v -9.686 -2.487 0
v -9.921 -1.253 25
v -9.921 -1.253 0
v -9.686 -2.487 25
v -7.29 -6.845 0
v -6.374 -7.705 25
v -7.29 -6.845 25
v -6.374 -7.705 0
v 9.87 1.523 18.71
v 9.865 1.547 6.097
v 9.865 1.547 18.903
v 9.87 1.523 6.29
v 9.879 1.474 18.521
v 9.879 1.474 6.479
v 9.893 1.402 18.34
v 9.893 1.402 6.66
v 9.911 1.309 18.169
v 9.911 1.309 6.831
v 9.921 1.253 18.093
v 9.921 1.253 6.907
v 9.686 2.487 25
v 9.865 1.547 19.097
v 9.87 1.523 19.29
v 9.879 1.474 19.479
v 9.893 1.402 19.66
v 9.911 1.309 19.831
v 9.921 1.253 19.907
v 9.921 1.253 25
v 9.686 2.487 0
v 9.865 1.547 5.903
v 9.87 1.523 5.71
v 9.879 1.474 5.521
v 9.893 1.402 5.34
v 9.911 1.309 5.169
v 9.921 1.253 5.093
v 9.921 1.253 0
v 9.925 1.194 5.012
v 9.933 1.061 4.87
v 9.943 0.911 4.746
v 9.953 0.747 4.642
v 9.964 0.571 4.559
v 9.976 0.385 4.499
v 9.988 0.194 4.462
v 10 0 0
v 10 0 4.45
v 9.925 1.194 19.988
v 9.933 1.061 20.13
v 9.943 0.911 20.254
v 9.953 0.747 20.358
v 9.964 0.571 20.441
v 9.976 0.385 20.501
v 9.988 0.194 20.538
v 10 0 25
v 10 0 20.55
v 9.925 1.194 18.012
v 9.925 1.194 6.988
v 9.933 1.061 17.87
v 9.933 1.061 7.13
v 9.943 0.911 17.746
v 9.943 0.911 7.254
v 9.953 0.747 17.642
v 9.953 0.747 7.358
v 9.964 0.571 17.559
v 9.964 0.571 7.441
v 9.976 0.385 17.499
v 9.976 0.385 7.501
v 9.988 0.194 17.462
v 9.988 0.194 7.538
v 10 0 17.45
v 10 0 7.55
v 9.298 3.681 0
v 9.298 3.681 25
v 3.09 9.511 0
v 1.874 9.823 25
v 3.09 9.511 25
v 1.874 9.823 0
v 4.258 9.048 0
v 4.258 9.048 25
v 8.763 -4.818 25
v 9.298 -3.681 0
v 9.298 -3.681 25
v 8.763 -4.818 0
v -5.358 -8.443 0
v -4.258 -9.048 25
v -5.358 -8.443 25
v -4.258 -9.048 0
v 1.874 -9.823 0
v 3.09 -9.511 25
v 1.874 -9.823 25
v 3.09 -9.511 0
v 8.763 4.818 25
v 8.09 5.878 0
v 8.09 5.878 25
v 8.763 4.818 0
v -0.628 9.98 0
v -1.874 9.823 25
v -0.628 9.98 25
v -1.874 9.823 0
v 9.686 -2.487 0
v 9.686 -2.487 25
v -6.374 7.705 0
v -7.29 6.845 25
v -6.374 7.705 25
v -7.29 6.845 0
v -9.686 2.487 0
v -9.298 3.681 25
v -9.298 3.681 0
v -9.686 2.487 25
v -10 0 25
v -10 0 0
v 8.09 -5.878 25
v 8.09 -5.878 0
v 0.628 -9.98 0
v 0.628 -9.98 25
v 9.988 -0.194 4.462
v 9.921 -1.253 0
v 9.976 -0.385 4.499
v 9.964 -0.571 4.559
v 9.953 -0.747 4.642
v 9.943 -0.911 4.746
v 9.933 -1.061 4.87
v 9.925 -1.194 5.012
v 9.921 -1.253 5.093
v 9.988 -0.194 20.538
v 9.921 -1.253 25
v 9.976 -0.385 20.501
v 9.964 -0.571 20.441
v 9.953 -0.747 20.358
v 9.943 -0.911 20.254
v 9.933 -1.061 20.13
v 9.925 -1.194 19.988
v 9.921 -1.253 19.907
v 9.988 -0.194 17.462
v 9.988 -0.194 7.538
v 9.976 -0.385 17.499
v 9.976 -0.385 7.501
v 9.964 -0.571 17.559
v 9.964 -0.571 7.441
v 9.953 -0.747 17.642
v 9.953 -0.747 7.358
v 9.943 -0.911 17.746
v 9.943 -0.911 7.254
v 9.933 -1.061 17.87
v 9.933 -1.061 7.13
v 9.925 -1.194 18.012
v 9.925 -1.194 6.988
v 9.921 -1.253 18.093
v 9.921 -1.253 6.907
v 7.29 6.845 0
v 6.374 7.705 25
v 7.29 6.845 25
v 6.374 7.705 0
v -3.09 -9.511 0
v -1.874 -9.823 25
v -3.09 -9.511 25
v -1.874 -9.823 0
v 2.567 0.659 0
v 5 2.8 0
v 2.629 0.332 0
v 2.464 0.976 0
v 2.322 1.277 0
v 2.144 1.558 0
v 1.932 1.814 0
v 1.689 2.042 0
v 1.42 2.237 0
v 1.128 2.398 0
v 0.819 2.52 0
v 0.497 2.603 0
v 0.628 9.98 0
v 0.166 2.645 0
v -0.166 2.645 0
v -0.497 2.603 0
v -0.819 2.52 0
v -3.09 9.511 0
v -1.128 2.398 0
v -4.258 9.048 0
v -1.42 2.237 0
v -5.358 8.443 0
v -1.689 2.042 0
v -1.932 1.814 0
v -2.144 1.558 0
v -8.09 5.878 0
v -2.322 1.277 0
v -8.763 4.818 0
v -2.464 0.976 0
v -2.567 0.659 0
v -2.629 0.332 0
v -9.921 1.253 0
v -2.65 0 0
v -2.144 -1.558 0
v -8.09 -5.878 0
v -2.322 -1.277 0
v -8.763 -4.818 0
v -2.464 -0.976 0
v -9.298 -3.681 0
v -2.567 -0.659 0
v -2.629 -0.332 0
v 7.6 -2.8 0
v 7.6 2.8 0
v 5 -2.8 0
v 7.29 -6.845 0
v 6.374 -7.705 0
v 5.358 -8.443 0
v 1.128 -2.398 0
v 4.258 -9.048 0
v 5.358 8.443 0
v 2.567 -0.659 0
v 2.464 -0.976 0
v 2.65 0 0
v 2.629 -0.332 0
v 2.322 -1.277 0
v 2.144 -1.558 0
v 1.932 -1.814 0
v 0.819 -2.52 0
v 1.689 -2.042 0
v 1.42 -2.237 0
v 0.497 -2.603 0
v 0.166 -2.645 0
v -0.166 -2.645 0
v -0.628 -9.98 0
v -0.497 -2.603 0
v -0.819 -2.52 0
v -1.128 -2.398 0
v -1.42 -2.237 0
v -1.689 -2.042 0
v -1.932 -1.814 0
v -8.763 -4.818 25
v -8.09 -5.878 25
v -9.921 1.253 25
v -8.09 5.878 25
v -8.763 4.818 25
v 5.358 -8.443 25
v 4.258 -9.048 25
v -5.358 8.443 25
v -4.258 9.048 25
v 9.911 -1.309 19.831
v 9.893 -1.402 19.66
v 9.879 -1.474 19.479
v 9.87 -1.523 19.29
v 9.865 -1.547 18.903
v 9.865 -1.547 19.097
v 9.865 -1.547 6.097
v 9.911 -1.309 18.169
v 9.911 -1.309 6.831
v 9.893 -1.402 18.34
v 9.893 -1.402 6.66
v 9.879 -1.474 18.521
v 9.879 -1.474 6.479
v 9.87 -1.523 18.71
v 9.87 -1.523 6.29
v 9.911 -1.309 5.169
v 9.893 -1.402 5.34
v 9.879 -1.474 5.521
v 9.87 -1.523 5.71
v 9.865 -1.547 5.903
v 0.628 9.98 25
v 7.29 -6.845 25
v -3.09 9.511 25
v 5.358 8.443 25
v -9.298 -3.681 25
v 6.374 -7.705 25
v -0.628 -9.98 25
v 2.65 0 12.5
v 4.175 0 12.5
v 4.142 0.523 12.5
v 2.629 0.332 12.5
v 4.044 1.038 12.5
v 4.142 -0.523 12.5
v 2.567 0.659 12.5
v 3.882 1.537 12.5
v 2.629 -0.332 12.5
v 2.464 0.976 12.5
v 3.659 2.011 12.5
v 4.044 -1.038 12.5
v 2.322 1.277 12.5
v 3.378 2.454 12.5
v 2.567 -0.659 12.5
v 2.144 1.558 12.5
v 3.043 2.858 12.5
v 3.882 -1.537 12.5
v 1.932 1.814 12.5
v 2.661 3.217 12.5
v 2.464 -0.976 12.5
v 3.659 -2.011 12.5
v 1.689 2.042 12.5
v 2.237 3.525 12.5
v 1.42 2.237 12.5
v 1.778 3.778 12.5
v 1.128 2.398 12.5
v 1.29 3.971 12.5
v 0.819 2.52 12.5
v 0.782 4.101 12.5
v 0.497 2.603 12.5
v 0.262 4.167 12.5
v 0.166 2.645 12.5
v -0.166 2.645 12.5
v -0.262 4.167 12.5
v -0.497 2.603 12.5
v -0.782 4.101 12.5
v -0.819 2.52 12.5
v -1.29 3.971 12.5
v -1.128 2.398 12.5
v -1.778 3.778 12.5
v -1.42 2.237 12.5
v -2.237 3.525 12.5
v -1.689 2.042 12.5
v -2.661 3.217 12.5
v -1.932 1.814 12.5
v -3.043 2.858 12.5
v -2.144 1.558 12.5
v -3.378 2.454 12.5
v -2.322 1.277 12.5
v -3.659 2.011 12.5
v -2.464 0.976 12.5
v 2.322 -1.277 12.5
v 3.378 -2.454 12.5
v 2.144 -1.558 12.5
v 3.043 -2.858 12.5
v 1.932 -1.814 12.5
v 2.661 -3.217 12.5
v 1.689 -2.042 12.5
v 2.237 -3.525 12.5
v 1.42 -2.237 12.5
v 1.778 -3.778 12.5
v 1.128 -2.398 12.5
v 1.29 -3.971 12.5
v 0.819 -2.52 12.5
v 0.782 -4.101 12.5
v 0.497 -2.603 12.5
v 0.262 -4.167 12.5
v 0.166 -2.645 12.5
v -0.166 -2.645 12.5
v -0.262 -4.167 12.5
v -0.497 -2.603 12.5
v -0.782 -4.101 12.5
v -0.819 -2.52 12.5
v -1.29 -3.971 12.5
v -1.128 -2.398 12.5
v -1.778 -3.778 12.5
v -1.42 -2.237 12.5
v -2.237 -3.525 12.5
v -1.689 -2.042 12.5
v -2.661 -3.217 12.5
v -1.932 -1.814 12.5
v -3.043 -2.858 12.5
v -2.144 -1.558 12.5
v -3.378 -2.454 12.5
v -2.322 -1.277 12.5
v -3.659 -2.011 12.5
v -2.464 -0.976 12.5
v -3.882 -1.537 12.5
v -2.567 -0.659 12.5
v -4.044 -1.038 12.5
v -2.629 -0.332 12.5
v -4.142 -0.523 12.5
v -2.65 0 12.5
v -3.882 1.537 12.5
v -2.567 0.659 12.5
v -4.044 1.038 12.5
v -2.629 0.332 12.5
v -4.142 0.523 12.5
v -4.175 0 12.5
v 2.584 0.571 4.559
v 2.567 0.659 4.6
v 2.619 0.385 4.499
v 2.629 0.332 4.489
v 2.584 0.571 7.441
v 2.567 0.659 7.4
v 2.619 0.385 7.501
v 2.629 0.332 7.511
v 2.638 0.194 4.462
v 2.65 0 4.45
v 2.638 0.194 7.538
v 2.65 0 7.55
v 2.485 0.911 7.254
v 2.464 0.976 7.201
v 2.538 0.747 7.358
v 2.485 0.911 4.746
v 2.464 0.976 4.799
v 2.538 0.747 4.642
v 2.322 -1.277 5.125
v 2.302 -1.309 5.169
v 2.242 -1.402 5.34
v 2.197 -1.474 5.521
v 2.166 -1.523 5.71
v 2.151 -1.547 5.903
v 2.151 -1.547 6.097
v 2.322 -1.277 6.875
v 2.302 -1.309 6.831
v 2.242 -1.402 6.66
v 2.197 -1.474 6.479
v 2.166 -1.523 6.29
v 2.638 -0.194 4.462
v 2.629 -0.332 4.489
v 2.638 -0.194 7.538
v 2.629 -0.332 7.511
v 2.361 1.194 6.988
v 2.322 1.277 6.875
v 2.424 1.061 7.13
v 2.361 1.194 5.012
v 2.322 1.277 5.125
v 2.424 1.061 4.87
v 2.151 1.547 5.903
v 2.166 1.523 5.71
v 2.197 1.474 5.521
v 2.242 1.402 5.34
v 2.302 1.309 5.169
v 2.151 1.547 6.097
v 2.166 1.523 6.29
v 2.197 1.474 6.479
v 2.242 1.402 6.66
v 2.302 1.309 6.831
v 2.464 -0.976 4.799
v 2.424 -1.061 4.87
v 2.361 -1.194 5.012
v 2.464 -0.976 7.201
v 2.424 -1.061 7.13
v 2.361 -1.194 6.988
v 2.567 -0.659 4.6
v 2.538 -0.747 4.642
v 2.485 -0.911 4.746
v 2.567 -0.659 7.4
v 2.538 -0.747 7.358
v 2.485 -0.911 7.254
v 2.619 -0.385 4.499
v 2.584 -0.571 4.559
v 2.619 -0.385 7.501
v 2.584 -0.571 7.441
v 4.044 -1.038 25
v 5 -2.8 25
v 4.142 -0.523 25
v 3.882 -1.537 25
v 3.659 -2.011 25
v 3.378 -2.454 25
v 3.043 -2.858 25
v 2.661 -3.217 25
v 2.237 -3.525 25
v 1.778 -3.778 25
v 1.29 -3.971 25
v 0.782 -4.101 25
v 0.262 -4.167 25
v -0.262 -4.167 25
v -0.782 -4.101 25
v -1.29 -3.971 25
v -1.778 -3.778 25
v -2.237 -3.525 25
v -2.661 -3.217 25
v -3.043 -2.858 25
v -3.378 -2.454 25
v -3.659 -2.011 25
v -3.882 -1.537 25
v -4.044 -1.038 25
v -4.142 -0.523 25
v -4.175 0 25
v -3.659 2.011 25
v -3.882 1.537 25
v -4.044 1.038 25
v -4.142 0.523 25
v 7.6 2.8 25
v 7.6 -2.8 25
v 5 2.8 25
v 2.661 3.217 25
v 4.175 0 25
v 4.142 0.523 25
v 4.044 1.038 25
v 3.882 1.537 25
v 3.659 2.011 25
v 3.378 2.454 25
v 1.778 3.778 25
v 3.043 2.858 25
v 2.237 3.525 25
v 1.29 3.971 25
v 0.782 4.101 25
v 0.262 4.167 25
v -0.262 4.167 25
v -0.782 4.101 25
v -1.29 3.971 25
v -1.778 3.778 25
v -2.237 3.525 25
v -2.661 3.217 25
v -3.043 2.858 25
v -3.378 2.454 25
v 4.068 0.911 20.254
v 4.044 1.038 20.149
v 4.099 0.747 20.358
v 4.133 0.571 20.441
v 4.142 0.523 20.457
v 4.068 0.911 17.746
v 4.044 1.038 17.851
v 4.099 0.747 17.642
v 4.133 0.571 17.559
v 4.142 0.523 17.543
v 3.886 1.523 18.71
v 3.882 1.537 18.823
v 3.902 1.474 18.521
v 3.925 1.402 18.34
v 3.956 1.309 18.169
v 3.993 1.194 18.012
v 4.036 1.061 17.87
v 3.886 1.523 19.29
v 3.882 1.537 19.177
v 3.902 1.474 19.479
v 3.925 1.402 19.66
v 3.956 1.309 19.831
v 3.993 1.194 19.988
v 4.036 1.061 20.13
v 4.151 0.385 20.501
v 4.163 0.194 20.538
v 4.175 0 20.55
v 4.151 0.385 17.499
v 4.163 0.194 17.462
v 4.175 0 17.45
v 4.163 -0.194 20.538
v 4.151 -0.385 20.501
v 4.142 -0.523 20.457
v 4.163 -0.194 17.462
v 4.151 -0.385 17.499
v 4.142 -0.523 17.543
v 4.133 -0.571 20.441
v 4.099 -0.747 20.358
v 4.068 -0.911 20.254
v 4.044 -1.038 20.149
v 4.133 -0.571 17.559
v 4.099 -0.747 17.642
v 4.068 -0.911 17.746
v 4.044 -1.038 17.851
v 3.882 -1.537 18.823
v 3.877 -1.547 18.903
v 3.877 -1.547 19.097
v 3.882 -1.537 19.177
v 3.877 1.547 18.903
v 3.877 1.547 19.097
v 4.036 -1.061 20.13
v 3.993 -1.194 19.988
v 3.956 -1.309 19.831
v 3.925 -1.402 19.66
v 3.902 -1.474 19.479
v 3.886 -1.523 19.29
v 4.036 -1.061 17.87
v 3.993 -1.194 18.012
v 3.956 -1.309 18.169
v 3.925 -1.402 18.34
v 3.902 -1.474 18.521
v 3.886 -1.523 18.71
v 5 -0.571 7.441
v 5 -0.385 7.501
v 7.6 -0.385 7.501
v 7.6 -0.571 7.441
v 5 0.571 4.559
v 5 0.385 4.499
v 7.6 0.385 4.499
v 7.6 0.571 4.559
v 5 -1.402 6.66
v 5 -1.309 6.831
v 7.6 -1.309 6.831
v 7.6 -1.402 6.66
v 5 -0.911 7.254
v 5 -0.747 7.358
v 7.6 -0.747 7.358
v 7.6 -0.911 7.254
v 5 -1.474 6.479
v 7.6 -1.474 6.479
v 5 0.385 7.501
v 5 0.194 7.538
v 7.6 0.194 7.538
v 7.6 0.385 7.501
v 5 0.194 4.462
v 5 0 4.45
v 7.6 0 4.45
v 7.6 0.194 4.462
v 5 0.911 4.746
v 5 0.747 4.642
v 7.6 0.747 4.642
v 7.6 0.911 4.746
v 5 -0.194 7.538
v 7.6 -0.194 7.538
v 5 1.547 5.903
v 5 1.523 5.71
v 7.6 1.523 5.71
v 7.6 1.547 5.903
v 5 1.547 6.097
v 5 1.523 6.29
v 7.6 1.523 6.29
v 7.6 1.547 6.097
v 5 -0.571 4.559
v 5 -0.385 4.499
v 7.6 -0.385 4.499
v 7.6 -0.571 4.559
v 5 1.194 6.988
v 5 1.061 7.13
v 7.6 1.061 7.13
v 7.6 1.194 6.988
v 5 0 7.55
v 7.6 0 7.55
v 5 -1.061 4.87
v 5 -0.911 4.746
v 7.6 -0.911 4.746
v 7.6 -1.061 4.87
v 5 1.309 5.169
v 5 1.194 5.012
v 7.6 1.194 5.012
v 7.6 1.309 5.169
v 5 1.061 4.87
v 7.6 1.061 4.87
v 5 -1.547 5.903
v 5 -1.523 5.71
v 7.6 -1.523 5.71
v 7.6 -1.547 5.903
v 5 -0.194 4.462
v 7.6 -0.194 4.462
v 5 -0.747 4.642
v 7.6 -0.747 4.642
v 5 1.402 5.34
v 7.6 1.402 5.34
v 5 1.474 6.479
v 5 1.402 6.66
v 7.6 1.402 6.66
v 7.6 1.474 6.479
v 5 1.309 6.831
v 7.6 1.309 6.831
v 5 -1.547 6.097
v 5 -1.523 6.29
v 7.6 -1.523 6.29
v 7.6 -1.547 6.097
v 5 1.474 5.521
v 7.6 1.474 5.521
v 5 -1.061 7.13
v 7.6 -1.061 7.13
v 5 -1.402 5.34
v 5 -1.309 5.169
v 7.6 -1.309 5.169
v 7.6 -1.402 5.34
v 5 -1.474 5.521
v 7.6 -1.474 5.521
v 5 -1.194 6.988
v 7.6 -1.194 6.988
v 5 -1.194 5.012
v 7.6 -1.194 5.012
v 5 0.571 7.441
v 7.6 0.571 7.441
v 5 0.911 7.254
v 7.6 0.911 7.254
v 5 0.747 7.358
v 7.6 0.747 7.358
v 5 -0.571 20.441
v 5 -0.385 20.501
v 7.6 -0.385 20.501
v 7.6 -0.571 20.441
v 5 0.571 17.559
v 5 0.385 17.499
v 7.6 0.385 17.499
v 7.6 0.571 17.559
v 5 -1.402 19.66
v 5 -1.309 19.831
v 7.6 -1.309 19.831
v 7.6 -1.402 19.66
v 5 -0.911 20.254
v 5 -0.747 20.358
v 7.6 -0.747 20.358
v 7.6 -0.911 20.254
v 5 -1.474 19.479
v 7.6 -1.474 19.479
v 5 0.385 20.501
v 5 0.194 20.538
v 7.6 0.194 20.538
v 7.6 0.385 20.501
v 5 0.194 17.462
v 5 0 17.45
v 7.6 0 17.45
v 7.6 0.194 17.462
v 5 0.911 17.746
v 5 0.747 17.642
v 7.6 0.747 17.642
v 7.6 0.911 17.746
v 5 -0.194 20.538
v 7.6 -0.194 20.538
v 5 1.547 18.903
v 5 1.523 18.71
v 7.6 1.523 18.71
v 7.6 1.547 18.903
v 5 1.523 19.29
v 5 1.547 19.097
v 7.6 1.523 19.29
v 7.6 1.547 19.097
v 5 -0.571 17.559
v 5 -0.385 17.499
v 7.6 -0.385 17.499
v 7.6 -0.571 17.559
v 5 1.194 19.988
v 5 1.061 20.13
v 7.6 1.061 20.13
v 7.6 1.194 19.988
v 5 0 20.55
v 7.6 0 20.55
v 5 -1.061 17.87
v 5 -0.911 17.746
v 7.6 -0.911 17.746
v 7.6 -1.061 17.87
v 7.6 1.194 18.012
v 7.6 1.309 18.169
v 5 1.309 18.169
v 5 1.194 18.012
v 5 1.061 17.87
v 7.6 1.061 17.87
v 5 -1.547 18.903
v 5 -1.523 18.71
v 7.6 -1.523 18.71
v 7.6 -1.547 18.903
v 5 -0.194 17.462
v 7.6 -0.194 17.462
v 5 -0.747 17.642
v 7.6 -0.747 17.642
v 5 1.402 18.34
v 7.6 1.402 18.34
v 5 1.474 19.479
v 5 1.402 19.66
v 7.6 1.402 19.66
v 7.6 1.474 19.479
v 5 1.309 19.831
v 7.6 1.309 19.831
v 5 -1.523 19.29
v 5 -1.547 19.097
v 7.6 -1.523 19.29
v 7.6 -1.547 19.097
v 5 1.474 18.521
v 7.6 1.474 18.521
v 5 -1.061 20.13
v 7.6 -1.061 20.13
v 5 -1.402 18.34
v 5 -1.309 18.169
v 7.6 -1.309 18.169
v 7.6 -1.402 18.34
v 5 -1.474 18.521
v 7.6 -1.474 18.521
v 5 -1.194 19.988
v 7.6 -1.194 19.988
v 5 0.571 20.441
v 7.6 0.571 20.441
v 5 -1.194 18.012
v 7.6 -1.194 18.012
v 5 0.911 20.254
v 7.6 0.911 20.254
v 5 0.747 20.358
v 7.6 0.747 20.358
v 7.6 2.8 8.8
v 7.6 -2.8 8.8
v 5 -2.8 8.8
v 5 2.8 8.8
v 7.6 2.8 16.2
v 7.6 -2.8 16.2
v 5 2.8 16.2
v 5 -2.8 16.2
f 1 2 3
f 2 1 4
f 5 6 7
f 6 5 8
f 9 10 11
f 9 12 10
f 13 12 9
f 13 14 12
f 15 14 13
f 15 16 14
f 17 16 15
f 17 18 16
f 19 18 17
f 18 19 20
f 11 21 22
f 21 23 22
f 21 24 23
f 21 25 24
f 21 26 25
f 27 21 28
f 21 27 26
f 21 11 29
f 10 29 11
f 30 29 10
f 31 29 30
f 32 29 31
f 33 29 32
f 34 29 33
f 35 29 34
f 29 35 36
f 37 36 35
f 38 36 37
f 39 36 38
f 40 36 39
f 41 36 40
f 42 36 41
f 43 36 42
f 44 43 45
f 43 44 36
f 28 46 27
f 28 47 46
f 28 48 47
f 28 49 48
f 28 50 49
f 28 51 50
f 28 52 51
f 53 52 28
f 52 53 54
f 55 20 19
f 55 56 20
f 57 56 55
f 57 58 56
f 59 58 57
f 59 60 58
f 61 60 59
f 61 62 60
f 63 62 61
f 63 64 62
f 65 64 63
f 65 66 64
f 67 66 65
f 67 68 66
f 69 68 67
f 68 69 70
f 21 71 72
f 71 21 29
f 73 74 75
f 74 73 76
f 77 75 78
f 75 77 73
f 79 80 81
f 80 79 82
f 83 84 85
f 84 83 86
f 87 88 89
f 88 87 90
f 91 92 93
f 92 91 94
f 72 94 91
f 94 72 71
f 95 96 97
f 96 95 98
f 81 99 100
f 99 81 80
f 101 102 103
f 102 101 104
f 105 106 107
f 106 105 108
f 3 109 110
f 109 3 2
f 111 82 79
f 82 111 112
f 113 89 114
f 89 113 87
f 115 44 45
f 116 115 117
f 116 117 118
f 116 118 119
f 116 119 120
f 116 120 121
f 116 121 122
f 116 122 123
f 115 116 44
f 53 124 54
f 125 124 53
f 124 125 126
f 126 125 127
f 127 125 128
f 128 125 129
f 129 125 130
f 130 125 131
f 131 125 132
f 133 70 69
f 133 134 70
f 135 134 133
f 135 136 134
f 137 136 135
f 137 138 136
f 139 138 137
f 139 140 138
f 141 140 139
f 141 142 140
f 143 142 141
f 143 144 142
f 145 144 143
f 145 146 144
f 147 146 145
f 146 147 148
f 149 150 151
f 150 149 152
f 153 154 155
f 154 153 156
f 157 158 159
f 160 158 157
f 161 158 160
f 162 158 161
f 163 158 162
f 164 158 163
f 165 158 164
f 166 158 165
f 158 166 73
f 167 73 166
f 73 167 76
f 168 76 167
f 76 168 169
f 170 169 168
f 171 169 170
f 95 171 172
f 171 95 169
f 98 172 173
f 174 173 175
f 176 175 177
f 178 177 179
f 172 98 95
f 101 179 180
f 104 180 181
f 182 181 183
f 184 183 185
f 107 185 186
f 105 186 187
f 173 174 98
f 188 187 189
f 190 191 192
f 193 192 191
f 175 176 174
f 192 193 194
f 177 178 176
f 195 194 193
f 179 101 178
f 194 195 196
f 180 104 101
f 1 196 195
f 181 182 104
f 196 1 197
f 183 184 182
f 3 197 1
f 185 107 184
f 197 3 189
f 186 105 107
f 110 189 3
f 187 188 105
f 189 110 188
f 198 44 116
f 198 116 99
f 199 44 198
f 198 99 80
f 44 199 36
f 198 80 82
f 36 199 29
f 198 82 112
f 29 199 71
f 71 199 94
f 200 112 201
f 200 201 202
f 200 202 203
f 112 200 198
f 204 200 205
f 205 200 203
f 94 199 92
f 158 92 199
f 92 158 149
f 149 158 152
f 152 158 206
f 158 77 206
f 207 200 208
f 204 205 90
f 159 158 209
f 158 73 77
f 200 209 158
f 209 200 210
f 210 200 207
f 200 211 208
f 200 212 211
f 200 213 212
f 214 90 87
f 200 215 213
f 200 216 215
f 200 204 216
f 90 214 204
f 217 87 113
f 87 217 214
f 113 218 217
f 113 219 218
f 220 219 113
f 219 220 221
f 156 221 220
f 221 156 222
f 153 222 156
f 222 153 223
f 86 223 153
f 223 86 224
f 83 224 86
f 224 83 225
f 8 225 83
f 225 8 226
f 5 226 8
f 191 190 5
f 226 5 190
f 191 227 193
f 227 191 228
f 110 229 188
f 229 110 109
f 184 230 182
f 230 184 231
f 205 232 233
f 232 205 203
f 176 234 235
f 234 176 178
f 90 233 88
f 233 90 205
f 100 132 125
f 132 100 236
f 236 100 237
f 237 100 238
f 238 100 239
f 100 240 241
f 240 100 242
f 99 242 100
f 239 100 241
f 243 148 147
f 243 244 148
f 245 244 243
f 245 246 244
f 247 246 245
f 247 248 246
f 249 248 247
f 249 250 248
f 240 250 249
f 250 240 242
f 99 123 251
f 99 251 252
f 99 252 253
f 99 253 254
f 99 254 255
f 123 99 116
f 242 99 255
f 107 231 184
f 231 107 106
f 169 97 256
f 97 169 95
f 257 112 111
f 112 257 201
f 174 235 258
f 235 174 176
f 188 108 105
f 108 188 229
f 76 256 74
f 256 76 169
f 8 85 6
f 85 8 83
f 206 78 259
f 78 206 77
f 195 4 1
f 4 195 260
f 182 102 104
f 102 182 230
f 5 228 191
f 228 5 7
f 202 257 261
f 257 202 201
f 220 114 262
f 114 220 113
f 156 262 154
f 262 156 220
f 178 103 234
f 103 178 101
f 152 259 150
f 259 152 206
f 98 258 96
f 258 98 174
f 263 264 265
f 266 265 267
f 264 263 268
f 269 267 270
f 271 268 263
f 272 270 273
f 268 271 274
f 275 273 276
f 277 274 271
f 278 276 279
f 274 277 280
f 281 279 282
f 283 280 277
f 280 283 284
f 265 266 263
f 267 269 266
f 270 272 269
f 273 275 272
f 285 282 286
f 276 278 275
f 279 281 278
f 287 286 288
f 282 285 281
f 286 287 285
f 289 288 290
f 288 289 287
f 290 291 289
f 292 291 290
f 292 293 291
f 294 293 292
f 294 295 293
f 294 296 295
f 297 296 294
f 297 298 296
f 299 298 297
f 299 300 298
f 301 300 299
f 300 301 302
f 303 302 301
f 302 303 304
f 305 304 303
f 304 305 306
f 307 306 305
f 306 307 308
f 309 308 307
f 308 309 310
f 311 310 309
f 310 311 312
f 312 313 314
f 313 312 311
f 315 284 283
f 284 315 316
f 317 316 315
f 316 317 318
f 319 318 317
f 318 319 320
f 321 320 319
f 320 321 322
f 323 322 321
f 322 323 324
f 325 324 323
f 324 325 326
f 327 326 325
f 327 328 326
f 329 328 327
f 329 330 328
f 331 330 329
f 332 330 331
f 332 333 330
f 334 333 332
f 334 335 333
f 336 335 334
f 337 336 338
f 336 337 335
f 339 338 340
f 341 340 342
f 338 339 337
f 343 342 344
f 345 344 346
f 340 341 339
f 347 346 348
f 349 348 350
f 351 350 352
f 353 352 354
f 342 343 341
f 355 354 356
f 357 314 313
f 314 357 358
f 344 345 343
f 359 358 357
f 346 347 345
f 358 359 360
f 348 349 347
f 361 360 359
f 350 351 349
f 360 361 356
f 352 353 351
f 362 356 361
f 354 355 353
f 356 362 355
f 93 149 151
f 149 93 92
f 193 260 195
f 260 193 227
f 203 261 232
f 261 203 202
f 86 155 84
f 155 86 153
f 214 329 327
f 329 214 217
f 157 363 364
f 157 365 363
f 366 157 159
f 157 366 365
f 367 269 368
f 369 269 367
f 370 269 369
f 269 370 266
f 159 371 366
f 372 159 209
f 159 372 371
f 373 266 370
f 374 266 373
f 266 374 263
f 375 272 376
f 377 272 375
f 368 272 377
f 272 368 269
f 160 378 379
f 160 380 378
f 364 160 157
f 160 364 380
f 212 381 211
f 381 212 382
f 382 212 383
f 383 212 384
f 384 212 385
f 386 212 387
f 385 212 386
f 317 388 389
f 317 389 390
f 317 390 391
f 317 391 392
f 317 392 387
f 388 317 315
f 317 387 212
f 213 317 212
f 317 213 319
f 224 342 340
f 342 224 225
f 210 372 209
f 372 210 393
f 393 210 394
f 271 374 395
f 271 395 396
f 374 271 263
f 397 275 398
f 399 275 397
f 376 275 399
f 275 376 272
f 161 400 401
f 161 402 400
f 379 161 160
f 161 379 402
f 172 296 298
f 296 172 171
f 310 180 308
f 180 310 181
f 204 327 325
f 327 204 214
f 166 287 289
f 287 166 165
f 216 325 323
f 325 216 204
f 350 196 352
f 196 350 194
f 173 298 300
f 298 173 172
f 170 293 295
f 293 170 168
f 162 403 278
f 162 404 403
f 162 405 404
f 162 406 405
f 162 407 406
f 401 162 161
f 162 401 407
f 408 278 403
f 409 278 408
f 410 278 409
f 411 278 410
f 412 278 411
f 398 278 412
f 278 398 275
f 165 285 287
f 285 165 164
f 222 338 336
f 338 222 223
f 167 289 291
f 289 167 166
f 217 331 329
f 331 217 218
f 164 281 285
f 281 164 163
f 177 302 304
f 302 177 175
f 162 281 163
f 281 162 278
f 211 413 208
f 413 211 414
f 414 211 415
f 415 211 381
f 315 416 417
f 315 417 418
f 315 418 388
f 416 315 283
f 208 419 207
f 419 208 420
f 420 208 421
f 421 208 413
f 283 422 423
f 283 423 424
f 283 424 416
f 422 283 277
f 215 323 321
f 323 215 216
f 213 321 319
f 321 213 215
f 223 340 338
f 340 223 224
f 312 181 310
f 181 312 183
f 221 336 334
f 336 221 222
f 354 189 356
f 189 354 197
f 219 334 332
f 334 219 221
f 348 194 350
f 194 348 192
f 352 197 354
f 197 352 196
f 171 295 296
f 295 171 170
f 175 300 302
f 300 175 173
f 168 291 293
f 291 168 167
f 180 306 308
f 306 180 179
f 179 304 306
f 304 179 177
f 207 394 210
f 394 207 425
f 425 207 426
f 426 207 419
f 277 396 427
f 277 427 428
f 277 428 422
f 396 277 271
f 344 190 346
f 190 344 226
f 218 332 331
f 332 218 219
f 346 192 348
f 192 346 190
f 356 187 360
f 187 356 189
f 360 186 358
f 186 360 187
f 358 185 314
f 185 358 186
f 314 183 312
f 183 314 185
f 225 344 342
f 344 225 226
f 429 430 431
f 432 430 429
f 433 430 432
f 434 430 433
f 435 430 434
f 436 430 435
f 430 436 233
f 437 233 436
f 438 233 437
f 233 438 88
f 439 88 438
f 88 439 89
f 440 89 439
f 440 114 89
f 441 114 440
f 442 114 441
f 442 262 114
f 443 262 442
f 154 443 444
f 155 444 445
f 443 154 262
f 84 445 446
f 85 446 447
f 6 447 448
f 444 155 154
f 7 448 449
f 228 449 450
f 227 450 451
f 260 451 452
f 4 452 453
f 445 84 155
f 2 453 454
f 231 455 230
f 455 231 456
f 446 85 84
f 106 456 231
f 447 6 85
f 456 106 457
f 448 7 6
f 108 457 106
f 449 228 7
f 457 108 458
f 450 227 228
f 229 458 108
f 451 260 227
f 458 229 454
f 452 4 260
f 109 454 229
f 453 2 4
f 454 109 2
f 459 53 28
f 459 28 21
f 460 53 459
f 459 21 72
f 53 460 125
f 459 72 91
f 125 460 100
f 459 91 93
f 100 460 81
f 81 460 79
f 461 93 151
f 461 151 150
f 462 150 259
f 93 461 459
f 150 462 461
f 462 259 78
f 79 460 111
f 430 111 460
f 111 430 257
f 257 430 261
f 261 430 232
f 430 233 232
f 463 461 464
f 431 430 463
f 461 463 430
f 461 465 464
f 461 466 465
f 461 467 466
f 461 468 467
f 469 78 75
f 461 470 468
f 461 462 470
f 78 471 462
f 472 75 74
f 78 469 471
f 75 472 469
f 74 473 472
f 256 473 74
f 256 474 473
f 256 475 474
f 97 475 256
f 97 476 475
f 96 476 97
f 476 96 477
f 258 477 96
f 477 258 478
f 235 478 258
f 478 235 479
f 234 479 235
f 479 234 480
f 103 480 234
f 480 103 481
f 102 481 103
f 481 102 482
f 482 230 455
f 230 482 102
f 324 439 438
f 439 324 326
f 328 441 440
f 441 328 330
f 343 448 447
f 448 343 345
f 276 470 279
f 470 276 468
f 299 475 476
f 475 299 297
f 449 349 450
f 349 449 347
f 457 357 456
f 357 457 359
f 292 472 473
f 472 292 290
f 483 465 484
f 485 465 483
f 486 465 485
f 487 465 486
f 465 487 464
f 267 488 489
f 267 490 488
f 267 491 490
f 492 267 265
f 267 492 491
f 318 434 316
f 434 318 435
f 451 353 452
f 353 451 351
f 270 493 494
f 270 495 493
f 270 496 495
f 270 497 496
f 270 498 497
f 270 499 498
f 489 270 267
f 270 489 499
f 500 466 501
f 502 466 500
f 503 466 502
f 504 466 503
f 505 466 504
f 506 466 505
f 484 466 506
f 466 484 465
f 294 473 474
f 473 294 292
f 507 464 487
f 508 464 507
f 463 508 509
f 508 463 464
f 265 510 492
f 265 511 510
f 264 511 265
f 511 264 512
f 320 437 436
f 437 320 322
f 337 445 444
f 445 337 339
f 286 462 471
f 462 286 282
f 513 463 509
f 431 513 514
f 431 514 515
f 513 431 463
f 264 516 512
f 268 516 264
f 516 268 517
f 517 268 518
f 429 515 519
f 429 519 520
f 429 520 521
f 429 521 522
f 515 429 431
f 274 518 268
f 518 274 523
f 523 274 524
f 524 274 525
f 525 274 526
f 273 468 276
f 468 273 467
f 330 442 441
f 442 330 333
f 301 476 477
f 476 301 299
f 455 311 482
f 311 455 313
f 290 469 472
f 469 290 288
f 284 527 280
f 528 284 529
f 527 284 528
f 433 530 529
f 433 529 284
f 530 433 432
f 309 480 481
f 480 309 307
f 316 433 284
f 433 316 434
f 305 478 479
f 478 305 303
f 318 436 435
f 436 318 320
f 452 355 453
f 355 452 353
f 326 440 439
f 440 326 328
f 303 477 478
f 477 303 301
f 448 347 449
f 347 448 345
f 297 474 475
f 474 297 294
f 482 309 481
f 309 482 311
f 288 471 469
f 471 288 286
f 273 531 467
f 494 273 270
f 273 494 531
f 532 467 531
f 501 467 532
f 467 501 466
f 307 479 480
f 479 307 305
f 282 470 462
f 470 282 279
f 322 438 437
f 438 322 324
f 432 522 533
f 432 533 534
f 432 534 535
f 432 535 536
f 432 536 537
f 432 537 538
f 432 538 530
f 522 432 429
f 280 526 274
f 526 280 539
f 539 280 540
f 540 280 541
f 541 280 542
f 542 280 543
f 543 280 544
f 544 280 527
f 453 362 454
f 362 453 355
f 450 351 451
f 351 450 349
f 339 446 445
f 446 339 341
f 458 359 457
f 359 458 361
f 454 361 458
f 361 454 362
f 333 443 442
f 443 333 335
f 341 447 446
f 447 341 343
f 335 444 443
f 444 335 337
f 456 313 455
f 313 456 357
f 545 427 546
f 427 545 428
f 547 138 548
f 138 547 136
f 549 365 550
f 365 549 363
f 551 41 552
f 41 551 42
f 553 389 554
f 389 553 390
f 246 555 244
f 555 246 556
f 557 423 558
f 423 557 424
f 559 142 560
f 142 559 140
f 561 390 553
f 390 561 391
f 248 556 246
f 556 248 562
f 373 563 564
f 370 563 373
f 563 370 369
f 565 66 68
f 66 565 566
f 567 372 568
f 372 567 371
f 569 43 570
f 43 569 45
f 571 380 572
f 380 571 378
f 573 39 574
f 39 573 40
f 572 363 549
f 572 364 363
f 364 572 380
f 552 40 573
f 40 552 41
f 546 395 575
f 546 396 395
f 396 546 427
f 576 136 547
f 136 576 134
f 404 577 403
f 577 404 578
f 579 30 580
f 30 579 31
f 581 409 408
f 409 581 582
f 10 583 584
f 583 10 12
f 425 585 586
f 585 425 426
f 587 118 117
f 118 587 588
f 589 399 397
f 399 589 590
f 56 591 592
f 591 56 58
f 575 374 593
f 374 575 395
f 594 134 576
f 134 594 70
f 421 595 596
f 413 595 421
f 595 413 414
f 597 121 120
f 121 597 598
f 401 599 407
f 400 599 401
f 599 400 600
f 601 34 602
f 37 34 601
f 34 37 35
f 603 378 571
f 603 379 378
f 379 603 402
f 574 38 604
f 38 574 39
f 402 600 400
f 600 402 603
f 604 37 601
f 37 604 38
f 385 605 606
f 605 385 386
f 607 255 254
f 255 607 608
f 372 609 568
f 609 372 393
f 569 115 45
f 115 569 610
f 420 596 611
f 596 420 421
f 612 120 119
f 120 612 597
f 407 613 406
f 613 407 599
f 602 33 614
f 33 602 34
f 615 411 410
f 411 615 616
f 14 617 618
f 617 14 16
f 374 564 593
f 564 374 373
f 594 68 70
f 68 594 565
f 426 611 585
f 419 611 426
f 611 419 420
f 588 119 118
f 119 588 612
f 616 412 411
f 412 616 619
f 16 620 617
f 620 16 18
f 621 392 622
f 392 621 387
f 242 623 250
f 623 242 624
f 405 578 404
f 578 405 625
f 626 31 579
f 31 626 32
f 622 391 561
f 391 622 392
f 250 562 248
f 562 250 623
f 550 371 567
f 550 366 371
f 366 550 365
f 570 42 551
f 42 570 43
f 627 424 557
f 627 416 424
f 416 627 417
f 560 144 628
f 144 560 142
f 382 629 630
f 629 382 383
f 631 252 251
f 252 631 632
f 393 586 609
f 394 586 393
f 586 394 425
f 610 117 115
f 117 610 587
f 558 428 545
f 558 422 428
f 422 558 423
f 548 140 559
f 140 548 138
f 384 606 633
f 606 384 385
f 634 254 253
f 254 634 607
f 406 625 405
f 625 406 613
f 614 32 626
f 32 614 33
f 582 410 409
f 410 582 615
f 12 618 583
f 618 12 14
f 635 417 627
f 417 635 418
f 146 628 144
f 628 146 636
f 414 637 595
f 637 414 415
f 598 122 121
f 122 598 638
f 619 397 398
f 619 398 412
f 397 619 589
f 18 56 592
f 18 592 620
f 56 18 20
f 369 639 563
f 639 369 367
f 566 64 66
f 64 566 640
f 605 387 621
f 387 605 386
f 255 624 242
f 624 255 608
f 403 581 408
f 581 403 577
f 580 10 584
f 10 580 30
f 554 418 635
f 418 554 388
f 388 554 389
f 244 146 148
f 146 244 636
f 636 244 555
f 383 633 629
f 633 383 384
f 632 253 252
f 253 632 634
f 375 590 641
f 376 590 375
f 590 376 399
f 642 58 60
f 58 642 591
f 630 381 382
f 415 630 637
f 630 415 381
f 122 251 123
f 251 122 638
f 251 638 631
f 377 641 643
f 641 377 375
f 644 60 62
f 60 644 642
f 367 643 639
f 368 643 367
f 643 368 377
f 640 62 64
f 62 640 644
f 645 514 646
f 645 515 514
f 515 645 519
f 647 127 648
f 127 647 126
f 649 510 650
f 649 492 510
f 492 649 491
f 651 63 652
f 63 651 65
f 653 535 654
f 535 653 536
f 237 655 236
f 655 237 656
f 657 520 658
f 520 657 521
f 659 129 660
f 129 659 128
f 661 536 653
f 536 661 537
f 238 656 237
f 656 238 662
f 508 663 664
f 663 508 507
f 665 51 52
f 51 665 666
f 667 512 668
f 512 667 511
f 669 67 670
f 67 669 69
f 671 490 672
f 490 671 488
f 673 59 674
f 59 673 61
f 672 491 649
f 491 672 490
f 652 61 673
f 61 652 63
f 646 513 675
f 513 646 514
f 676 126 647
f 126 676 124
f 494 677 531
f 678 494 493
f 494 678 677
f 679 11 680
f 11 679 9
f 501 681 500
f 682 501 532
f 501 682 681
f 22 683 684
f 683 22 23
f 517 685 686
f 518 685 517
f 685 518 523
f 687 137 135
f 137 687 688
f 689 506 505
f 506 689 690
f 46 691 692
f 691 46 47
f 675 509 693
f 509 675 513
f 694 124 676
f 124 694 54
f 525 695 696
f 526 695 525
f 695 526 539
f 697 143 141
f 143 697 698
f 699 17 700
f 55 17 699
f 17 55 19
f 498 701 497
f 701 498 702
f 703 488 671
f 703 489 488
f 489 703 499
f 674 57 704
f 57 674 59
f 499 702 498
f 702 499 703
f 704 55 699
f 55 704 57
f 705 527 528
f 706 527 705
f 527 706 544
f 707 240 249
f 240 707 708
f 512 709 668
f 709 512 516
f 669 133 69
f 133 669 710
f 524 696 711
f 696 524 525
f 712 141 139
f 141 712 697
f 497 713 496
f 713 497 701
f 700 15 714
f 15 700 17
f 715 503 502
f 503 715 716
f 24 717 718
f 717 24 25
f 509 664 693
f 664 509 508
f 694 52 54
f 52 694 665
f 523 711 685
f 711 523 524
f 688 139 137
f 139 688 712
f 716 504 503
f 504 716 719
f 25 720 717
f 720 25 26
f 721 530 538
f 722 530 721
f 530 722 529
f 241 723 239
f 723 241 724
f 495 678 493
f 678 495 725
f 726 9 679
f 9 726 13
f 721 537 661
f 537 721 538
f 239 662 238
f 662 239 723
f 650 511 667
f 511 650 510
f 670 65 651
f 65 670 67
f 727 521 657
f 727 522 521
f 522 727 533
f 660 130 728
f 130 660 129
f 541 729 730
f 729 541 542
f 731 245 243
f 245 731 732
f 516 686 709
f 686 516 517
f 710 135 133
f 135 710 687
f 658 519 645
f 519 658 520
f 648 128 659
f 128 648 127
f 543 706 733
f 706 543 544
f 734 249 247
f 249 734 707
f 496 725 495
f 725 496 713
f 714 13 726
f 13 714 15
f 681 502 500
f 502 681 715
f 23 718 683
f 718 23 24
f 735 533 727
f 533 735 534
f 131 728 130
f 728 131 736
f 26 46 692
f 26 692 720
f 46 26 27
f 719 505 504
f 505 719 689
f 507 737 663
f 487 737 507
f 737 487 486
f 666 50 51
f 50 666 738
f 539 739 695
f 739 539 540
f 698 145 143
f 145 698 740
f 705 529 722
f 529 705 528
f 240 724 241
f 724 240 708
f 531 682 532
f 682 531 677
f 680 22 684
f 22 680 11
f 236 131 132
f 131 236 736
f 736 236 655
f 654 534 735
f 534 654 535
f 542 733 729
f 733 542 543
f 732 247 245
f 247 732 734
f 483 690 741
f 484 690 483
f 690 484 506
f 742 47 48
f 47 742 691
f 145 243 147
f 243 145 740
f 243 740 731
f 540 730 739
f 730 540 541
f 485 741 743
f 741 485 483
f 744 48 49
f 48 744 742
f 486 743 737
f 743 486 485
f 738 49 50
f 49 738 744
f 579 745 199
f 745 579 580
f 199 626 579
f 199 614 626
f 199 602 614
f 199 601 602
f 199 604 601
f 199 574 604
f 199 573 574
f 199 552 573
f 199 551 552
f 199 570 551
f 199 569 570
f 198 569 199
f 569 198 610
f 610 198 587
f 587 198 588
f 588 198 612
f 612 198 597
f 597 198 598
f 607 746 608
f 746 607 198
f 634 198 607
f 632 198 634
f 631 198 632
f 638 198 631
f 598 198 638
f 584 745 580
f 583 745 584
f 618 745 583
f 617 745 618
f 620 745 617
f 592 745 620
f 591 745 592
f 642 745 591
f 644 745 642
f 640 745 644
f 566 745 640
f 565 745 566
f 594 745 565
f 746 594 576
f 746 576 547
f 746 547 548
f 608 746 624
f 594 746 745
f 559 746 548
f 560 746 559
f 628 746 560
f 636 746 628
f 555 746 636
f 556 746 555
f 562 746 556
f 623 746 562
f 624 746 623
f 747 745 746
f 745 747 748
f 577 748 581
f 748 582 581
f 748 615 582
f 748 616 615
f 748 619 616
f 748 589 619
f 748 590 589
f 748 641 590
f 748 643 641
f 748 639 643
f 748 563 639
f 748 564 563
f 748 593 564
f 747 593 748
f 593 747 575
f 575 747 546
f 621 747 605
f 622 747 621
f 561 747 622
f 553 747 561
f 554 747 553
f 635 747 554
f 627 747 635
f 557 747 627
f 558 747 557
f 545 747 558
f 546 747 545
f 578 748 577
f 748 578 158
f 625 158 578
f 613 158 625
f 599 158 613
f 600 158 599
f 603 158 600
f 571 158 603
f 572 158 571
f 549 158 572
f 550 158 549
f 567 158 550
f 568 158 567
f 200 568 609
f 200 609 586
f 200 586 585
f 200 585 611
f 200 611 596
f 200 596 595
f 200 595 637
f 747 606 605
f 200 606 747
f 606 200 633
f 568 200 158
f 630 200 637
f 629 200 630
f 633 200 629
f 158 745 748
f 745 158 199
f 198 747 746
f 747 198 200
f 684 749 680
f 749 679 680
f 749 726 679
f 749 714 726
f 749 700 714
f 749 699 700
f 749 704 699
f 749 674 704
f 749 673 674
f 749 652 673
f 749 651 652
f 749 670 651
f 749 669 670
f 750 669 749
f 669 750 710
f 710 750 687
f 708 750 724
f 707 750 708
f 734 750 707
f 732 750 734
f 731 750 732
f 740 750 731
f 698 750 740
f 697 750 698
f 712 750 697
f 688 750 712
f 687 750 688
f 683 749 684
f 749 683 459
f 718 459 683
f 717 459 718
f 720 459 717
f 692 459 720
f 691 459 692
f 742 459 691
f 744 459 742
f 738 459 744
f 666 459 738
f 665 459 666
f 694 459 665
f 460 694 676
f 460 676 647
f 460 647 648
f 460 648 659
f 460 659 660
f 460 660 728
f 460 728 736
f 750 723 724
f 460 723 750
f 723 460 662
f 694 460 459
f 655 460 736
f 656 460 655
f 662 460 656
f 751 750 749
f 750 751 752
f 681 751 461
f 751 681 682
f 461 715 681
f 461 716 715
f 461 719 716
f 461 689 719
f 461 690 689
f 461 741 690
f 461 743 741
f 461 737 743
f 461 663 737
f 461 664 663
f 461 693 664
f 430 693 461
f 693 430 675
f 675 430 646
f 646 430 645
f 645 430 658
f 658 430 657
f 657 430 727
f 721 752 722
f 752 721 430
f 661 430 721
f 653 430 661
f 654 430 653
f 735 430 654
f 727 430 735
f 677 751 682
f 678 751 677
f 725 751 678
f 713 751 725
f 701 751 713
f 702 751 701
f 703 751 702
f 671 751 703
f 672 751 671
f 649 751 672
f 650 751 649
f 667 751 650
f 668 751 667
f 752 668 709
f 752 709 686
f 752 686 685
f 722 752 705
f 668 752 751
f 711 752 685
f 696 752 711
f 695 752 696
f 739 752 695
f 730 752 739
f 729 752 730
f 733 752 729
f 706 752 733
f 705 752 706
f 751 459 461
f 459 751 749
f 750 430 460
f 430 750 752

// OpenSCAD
//z axis coupler
// Glyn Cowles Dec 2017
$fn=50;
lScrewD=8.35; //lead screw diam
sScrewD=5.3; // stepper diam
oDiam=20; // outer diam
ht=25; // overall height 
nWd=5.6; // nut width
nHt=2.6; // nut height
sDiam=3.1; // holding screw diam
sDist=6; // distance to screws
add=5; // extra height on nut space to clear top/bottom


//test();
main();
//-----------------------------------------------------------
module test() { // to test fit of shafts and nut
    x=12; // diam
    z=4; // height
difference() {
    union() {
        translate([0,0,0]) tube(sScrewD,x,z);
        translate([4.5,-5,0]) cube([6,10,z]);
        translate([15,0,0]) tube(lScrewD,x,z);
        }
    translate([6.5,-2.5,0])  cube([nHt,nWd,nWd]);
    }
}
//-----------------------------------------------------------
module main() {
difference() {
    union() {
        translate([0,0,0]) tube(sScrewD,oDiam,ht/2);
        translate([0,0,ht/2]) tube(lScrewD,oDiam,ht/2);
        }
    translate([.3,0,sDist]) rotate([0,90,0]) cylinder(d=sDiam,h=oDiam/2);
    translate([.3,0,ht-sDist]) rotate([0,90,0]) cylinder(d=sDiam,h=oDiam/2);
    translate([oDiam/4,-nWd/2,sDist-nWd/2-add])  cube([nHt,nWd,nWd+add]);
    translate([oDiam/4,-nWd/2,ht-sDist-nWd/2]) cube([nHt,nWd,nWd+add]);
    }
}
//-----------------------------------------------------------
module tube(di,do,h) {

difference() {
cylinder(h=h,d=do);
cylinder(h=h,d=di);
}
}
